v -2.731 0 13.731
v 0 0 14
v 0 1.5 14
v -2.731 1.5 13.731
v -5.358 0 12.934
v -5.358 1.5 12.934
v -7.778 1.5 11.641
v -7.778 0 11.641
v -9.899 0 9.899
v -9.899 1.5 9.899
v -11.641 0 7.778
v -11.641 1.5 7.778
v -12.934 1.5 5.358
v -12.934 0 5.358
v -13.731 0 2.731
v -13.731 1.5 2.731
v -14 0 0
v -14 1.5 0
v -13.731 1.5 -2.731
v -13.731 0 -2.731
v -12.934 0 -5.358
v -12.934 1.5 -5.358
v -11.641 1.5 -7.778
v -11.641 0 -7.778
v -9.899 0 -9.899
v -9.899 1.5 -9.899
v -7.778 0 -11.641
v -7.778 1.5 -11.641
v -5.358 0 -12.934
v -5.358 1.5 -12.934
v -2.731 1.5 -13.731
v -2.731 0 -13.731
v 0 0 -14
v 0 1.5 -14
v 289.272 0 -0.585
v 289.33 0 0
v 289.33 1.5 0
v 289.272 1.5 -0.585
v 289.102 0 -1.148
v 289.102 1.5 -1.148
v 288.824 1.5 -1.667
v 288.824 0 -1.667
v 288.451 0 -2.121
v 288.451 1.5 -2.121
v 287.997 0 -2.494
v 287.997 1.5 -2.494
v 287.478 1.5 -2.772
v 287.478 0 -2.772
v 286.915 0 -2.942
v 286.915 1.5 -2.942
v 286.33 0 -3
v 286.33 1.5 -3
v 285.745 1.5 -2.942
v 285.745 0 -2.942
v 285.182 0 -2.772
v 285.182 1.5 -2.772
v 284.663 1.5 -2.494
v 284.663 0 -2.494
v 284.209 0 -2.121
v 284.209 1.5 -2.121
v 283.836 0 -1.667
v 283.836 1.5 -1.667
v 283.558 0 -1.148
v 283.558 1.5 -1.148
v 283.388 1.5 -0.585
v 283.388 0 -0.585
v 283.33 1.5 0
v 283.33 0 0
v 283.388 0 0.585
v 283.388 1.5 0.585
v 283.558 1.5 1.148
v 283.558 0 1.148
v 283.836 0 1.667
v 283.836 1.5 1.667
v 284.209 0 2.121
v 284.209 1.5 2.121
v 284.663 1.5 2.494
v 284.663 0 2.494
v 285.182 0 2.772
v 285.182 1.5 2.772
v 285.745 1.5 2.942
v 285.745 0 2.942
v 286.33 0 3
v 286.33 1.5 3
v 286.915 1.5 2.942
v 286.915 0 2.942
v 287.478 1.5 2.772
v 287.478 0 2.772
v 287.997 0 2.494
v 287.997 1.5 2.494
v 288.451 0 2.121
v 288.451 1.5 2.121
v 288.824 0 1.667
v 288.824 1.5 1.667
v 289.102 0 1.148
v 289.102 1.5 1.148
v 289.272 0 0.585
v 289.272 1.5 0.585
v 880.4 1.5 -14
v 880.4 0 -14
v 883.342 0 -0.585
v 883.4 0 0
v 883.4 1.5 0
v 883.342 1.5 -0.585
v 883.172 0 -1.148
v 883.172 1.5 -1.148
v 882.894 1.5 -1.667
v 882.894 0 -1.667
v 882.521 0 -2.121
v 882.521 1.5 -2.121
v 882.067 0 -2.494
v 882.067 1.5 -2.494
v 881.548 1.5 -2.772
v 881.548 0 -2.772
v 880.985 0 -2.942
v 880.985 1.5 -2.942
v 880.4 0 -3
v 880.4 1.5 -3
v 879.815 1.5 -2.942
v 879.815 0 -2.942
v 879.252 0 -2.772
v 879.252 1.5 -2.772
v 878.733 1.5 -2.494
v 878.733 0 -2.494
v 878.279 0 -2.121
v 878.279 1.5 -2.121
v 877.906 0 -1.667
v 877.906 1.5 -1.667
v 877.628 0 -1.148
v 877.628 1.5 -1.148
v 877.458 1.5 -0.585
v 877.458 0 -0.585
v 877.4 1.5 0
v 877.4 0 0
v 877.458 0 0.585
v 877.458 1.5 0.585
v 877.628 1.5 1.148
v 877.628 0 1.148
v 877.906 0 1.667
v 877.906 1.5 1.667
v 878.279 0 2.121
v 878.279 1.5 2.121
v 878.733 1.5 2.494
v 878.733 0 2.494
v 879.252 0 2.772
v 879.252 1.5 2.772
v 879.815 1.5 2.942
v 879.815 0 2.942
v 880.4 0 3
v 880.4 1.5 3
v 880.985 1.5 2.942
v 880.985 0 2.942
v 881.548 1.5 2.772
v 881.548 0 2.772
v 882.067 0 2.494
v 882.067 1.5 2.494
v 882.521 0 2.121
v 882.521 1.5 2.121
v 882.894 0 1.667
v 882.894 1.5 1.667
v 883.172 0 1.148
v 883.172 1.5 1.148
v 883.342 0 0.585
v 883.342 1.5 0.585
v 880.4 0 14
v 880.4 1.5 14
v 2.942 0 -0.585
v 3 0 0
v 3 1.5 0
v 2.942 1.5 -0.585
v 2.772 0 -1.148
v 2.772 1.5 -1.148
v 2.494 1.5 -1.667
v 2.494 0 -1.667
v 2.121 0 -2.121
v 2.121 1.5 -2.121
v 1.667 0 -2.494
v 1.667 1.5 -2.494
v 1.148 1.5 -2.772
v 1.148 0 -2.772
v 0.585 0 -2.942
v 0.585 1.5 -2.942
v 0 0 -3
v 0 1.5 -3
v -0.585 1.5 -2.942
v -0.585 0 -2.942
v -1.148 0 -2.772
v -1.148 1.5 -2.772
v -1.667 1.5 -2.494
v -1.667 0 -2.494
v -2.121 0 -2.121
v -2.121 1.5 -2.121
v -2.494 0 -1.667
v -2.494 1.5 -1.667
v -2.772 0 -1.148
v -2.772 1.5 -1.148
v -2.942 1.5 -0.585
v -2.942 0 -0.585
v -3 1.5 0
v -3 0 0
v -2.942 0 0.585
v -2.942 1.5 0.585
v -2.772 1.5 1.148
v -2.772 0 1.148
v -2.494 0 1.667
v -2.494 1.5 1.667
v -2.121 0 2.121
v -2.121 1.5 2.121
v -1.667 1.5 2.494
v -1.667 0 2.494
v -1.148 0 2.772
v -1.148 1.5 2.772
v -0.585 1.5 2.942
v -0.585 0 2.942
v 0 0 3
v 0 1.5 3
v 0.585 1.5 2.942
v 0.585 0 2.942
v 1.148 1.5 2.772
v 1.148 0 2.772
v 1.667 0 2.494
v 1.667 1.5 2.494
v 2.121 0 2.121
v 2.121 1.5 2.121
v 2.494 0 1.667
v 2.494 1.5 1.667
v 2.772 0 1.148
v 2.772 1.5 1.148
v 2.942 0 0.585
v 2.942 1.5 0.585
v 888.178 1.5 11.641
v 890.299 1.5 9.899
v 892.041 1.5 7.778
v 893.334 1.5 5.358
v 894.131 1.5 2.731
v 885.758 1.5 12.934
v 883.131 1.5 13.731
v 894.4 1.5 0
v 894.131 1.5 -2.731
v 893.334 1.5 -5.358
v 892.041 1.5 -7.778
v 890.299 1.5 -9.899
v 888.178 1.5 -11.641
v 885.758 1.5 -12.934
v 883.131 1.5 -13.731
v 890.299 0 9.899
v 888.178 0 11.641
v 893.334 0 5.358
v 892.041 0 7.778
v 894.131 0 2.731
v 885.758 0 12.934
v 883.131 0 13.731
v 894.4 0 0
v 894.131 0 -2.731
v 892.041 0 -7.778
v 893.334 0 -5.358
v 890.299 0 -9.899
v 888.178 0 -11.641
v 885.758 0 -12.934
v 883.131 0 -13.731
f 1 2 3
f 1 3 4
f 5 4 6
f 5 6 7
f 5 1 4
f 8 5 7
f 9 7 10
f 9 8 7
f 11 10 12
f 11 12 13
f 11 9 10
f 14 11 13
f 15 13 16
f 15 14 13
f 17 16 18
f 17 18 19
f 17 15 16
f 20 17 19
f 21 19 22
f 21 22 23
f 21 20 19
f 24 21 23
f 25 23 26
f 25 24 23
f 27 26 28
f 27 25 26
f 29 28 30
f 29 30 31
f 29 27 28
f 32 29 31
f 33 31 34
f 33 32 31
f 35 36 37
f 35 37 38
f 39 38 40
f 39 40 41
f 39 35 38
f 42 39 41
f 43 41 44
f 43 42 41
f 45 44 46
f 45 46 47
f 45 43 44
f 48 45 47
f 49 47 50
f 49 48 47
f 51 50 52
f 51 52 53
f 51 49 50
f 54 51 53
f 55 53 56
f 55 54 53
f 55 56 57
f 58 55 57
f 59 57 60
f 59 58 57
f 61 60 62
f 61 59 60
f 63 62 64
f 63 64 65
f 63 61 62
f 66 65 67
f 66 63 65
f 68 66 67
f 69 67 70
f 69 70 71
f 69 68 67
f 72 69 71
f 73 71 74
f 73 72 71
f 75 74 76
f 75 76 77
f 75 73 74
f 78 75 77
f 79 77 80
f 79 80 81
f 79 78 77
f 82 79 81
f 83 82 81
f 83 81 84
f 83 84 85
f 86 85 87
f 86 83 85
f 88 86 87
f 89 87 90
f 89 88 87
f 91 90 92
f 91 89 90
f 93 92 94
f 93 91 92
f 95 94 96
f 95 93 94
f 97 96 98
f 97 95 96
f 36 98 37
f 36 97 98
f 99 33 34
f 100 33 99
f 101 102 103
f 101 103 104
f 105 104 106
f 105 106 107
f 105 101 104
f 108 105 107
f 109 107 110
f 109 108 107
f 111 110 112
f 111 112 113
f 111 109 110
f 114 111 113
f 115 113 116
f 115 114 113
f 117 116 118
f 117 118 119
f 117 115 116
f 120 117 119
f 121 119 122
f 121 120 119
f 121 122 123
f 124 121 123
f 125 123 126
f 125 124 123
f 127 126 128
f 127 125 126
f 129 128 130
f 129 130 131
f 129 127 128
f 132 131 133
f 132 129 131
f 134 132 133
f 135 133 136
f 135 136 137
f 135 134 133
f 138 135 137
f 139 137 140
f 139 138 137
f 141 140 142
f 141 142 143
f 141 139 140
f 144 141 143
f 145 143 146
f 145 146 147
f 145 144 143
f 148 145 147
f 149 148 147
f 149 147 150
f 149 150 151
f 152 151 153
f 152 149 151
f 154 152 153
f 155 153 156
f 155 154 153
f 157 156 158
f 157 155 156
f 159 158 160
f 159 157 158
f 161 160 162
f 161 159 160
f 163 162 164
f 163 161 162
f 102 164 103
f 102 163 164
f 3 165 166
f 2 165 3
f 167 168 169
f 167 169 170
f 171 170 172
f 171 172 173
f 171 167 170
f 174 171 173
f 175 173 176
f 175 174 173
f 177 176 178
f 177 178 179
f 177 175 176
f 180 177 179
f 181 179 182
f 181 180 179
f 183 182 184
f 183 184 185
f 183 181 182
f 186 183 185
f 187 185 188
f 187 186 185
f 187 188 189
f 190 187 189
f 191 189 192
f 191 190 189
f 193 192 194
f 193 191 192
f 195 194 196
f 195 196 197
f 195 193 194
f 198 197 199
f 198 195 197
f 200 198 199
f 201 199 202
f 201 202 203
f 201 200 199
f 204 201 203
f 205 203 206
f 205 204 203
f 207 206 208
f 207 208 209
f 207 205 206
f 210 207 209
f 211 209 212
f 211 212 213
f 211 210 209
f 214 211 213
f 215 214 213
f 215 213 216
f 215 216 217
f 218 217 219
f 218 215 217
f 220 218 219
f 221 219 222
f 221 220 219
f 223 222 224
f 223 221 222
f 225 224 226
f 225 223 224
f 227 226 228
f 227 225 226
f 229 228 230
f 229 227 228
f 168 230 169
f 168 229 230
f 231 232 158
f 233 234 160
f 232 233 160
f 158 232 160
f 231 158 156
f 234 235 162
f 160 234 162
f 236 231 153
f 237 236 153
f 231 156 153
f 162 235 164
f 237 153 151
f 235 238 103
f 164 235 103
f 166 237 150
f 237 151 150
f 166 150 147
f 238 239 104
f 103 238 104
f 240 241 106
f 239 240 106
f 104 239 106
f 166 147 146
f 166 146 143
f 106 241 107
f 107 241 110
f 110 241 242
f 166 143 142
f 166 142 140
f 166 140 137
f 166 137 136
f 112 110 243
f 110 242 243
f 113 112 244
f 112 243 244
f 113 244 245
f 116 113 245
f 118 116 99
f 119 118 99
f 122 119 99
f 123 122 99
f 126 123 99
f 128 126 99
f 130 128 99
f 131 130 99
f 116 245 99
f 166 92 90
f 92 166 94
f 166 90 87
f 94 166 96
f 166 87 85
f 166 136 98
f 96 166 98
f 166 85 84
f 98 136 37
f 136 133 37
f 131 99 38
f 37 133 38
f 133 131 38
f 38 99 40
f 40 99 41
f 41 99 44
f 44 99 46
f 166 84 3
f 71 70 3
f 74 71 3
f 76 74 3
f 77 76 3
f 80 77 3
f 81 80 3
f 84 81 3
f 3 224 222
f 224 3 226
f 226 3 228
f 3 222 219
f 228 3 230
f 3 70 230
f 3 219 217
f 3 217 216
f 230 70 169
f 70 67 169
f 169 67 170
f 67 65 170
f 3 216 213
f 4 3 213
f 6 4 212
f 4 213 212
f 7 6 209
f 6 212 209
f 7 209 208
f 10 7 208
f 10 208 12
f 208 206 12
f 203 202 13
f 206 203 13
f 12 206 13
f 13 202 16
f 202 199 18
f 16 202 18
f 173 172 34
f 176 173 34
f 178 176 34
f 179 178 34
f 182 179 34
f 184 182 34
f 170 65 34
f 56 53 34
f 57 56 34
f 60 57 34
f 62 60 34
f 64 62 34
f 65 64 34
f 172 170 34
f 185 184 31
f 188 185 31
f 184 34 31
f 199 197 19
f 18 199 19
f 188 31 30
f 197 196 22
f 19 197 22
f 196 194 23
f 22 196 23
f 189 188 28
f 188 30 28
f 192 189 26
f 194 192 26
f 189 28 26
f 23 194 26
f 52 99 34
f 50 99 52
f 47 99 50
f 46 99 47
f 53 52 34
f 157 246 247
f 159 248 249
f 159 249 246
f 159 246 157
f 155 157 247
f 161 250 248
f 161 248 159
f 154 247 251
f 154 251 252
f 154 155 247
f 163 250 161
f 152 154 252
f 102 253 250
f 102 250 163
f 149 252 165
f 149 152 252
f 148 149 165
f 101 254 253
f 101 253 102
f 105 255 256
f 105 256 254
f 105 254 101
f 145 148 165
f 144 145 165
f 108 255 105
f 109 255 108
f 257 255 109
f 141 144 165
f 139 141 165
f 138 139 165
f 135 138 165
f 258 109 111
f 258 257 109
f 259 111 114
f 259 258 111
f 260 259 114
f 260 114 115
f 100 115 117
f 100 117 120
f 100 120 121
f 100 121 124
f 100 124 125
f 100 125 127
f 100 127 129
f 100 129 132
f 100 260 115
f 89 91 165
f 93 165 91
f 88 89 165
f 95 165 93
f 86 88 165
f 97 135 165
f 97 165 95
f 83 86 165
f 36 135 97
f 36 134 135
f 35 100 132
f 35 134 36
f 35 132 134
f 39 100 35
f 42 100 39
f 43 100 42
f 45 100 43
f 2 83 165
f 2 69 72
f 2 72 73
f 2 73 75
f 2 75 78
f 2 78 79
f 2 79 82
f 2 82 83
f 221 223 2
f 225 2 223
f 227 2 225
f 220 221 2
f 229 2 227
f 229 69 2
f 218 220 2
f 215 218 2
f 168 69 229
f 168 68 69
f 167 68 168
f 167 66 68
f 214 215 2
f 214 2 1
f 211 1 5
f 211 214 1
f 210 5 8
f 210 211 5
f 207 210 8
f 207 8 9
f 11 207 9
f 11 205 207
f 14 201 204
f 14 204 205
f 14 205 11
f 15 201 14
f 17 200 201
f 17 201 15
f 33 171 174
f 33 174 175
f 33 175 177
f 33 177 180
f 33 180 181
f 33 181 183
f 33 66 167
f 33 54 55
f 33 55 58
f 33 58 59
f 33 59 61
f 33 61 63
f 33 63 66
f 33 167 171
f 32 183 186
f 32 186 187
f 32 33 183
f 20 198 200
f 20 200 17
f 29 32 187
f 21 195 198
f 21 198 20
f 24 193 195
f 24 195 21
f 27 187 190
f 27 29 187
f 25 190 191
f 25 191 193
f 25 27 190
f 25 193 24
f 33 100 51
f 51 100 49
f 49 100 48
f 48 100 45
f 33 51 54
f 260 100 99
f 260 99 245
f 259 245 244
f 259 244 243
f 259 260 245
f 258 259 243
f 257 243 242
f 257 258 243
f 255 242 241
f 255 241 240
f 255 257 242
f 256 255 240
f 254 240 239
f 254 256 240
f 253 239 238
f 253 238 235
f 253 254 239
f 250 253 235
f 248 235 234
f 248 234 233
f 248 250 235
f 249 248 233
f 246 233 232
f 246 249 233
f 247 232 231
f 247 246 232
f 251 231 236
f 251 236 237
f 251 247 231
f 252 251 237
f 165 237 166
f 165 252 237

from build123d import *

# Parameters (mm, degrees)
SKETCH1_R           = 3
BOSS_EXTRUDE1_DEPTH = 1.5


with BuildPart() as part:
    # Sketch1 → Boss-Extrude1 (new body)
    with BuildSketch(Plane(origin=(0, 0, 0), x_dir=(1, 0, 0), z_dir=(0, 1, 0))):
        with BuildLine():
            Line((0, 14), (880.4, 14))
            ThreePointArc((880.4, 14), (894.4, 0), (880.4, -14))
            Line((880.4, -14), (0, -14))
            ThreePointArc((0, -14), (-14, 0), (0, 14))
        make_face()
        with Locations((880.4, 0)):
            Circle(SKETCH1_R, mode=Mode.SUBTRACT)
        Circle(SKETCH1_R, mode=Mode.SUBTRACT)
        with Locations((286.33, 0)):
            Circle(SKETCH1_R, mode=Mode.SUBTRACT)
    extrude(amount=BOSS_EXTRUDE1_DEPTH)


solid = part.part
